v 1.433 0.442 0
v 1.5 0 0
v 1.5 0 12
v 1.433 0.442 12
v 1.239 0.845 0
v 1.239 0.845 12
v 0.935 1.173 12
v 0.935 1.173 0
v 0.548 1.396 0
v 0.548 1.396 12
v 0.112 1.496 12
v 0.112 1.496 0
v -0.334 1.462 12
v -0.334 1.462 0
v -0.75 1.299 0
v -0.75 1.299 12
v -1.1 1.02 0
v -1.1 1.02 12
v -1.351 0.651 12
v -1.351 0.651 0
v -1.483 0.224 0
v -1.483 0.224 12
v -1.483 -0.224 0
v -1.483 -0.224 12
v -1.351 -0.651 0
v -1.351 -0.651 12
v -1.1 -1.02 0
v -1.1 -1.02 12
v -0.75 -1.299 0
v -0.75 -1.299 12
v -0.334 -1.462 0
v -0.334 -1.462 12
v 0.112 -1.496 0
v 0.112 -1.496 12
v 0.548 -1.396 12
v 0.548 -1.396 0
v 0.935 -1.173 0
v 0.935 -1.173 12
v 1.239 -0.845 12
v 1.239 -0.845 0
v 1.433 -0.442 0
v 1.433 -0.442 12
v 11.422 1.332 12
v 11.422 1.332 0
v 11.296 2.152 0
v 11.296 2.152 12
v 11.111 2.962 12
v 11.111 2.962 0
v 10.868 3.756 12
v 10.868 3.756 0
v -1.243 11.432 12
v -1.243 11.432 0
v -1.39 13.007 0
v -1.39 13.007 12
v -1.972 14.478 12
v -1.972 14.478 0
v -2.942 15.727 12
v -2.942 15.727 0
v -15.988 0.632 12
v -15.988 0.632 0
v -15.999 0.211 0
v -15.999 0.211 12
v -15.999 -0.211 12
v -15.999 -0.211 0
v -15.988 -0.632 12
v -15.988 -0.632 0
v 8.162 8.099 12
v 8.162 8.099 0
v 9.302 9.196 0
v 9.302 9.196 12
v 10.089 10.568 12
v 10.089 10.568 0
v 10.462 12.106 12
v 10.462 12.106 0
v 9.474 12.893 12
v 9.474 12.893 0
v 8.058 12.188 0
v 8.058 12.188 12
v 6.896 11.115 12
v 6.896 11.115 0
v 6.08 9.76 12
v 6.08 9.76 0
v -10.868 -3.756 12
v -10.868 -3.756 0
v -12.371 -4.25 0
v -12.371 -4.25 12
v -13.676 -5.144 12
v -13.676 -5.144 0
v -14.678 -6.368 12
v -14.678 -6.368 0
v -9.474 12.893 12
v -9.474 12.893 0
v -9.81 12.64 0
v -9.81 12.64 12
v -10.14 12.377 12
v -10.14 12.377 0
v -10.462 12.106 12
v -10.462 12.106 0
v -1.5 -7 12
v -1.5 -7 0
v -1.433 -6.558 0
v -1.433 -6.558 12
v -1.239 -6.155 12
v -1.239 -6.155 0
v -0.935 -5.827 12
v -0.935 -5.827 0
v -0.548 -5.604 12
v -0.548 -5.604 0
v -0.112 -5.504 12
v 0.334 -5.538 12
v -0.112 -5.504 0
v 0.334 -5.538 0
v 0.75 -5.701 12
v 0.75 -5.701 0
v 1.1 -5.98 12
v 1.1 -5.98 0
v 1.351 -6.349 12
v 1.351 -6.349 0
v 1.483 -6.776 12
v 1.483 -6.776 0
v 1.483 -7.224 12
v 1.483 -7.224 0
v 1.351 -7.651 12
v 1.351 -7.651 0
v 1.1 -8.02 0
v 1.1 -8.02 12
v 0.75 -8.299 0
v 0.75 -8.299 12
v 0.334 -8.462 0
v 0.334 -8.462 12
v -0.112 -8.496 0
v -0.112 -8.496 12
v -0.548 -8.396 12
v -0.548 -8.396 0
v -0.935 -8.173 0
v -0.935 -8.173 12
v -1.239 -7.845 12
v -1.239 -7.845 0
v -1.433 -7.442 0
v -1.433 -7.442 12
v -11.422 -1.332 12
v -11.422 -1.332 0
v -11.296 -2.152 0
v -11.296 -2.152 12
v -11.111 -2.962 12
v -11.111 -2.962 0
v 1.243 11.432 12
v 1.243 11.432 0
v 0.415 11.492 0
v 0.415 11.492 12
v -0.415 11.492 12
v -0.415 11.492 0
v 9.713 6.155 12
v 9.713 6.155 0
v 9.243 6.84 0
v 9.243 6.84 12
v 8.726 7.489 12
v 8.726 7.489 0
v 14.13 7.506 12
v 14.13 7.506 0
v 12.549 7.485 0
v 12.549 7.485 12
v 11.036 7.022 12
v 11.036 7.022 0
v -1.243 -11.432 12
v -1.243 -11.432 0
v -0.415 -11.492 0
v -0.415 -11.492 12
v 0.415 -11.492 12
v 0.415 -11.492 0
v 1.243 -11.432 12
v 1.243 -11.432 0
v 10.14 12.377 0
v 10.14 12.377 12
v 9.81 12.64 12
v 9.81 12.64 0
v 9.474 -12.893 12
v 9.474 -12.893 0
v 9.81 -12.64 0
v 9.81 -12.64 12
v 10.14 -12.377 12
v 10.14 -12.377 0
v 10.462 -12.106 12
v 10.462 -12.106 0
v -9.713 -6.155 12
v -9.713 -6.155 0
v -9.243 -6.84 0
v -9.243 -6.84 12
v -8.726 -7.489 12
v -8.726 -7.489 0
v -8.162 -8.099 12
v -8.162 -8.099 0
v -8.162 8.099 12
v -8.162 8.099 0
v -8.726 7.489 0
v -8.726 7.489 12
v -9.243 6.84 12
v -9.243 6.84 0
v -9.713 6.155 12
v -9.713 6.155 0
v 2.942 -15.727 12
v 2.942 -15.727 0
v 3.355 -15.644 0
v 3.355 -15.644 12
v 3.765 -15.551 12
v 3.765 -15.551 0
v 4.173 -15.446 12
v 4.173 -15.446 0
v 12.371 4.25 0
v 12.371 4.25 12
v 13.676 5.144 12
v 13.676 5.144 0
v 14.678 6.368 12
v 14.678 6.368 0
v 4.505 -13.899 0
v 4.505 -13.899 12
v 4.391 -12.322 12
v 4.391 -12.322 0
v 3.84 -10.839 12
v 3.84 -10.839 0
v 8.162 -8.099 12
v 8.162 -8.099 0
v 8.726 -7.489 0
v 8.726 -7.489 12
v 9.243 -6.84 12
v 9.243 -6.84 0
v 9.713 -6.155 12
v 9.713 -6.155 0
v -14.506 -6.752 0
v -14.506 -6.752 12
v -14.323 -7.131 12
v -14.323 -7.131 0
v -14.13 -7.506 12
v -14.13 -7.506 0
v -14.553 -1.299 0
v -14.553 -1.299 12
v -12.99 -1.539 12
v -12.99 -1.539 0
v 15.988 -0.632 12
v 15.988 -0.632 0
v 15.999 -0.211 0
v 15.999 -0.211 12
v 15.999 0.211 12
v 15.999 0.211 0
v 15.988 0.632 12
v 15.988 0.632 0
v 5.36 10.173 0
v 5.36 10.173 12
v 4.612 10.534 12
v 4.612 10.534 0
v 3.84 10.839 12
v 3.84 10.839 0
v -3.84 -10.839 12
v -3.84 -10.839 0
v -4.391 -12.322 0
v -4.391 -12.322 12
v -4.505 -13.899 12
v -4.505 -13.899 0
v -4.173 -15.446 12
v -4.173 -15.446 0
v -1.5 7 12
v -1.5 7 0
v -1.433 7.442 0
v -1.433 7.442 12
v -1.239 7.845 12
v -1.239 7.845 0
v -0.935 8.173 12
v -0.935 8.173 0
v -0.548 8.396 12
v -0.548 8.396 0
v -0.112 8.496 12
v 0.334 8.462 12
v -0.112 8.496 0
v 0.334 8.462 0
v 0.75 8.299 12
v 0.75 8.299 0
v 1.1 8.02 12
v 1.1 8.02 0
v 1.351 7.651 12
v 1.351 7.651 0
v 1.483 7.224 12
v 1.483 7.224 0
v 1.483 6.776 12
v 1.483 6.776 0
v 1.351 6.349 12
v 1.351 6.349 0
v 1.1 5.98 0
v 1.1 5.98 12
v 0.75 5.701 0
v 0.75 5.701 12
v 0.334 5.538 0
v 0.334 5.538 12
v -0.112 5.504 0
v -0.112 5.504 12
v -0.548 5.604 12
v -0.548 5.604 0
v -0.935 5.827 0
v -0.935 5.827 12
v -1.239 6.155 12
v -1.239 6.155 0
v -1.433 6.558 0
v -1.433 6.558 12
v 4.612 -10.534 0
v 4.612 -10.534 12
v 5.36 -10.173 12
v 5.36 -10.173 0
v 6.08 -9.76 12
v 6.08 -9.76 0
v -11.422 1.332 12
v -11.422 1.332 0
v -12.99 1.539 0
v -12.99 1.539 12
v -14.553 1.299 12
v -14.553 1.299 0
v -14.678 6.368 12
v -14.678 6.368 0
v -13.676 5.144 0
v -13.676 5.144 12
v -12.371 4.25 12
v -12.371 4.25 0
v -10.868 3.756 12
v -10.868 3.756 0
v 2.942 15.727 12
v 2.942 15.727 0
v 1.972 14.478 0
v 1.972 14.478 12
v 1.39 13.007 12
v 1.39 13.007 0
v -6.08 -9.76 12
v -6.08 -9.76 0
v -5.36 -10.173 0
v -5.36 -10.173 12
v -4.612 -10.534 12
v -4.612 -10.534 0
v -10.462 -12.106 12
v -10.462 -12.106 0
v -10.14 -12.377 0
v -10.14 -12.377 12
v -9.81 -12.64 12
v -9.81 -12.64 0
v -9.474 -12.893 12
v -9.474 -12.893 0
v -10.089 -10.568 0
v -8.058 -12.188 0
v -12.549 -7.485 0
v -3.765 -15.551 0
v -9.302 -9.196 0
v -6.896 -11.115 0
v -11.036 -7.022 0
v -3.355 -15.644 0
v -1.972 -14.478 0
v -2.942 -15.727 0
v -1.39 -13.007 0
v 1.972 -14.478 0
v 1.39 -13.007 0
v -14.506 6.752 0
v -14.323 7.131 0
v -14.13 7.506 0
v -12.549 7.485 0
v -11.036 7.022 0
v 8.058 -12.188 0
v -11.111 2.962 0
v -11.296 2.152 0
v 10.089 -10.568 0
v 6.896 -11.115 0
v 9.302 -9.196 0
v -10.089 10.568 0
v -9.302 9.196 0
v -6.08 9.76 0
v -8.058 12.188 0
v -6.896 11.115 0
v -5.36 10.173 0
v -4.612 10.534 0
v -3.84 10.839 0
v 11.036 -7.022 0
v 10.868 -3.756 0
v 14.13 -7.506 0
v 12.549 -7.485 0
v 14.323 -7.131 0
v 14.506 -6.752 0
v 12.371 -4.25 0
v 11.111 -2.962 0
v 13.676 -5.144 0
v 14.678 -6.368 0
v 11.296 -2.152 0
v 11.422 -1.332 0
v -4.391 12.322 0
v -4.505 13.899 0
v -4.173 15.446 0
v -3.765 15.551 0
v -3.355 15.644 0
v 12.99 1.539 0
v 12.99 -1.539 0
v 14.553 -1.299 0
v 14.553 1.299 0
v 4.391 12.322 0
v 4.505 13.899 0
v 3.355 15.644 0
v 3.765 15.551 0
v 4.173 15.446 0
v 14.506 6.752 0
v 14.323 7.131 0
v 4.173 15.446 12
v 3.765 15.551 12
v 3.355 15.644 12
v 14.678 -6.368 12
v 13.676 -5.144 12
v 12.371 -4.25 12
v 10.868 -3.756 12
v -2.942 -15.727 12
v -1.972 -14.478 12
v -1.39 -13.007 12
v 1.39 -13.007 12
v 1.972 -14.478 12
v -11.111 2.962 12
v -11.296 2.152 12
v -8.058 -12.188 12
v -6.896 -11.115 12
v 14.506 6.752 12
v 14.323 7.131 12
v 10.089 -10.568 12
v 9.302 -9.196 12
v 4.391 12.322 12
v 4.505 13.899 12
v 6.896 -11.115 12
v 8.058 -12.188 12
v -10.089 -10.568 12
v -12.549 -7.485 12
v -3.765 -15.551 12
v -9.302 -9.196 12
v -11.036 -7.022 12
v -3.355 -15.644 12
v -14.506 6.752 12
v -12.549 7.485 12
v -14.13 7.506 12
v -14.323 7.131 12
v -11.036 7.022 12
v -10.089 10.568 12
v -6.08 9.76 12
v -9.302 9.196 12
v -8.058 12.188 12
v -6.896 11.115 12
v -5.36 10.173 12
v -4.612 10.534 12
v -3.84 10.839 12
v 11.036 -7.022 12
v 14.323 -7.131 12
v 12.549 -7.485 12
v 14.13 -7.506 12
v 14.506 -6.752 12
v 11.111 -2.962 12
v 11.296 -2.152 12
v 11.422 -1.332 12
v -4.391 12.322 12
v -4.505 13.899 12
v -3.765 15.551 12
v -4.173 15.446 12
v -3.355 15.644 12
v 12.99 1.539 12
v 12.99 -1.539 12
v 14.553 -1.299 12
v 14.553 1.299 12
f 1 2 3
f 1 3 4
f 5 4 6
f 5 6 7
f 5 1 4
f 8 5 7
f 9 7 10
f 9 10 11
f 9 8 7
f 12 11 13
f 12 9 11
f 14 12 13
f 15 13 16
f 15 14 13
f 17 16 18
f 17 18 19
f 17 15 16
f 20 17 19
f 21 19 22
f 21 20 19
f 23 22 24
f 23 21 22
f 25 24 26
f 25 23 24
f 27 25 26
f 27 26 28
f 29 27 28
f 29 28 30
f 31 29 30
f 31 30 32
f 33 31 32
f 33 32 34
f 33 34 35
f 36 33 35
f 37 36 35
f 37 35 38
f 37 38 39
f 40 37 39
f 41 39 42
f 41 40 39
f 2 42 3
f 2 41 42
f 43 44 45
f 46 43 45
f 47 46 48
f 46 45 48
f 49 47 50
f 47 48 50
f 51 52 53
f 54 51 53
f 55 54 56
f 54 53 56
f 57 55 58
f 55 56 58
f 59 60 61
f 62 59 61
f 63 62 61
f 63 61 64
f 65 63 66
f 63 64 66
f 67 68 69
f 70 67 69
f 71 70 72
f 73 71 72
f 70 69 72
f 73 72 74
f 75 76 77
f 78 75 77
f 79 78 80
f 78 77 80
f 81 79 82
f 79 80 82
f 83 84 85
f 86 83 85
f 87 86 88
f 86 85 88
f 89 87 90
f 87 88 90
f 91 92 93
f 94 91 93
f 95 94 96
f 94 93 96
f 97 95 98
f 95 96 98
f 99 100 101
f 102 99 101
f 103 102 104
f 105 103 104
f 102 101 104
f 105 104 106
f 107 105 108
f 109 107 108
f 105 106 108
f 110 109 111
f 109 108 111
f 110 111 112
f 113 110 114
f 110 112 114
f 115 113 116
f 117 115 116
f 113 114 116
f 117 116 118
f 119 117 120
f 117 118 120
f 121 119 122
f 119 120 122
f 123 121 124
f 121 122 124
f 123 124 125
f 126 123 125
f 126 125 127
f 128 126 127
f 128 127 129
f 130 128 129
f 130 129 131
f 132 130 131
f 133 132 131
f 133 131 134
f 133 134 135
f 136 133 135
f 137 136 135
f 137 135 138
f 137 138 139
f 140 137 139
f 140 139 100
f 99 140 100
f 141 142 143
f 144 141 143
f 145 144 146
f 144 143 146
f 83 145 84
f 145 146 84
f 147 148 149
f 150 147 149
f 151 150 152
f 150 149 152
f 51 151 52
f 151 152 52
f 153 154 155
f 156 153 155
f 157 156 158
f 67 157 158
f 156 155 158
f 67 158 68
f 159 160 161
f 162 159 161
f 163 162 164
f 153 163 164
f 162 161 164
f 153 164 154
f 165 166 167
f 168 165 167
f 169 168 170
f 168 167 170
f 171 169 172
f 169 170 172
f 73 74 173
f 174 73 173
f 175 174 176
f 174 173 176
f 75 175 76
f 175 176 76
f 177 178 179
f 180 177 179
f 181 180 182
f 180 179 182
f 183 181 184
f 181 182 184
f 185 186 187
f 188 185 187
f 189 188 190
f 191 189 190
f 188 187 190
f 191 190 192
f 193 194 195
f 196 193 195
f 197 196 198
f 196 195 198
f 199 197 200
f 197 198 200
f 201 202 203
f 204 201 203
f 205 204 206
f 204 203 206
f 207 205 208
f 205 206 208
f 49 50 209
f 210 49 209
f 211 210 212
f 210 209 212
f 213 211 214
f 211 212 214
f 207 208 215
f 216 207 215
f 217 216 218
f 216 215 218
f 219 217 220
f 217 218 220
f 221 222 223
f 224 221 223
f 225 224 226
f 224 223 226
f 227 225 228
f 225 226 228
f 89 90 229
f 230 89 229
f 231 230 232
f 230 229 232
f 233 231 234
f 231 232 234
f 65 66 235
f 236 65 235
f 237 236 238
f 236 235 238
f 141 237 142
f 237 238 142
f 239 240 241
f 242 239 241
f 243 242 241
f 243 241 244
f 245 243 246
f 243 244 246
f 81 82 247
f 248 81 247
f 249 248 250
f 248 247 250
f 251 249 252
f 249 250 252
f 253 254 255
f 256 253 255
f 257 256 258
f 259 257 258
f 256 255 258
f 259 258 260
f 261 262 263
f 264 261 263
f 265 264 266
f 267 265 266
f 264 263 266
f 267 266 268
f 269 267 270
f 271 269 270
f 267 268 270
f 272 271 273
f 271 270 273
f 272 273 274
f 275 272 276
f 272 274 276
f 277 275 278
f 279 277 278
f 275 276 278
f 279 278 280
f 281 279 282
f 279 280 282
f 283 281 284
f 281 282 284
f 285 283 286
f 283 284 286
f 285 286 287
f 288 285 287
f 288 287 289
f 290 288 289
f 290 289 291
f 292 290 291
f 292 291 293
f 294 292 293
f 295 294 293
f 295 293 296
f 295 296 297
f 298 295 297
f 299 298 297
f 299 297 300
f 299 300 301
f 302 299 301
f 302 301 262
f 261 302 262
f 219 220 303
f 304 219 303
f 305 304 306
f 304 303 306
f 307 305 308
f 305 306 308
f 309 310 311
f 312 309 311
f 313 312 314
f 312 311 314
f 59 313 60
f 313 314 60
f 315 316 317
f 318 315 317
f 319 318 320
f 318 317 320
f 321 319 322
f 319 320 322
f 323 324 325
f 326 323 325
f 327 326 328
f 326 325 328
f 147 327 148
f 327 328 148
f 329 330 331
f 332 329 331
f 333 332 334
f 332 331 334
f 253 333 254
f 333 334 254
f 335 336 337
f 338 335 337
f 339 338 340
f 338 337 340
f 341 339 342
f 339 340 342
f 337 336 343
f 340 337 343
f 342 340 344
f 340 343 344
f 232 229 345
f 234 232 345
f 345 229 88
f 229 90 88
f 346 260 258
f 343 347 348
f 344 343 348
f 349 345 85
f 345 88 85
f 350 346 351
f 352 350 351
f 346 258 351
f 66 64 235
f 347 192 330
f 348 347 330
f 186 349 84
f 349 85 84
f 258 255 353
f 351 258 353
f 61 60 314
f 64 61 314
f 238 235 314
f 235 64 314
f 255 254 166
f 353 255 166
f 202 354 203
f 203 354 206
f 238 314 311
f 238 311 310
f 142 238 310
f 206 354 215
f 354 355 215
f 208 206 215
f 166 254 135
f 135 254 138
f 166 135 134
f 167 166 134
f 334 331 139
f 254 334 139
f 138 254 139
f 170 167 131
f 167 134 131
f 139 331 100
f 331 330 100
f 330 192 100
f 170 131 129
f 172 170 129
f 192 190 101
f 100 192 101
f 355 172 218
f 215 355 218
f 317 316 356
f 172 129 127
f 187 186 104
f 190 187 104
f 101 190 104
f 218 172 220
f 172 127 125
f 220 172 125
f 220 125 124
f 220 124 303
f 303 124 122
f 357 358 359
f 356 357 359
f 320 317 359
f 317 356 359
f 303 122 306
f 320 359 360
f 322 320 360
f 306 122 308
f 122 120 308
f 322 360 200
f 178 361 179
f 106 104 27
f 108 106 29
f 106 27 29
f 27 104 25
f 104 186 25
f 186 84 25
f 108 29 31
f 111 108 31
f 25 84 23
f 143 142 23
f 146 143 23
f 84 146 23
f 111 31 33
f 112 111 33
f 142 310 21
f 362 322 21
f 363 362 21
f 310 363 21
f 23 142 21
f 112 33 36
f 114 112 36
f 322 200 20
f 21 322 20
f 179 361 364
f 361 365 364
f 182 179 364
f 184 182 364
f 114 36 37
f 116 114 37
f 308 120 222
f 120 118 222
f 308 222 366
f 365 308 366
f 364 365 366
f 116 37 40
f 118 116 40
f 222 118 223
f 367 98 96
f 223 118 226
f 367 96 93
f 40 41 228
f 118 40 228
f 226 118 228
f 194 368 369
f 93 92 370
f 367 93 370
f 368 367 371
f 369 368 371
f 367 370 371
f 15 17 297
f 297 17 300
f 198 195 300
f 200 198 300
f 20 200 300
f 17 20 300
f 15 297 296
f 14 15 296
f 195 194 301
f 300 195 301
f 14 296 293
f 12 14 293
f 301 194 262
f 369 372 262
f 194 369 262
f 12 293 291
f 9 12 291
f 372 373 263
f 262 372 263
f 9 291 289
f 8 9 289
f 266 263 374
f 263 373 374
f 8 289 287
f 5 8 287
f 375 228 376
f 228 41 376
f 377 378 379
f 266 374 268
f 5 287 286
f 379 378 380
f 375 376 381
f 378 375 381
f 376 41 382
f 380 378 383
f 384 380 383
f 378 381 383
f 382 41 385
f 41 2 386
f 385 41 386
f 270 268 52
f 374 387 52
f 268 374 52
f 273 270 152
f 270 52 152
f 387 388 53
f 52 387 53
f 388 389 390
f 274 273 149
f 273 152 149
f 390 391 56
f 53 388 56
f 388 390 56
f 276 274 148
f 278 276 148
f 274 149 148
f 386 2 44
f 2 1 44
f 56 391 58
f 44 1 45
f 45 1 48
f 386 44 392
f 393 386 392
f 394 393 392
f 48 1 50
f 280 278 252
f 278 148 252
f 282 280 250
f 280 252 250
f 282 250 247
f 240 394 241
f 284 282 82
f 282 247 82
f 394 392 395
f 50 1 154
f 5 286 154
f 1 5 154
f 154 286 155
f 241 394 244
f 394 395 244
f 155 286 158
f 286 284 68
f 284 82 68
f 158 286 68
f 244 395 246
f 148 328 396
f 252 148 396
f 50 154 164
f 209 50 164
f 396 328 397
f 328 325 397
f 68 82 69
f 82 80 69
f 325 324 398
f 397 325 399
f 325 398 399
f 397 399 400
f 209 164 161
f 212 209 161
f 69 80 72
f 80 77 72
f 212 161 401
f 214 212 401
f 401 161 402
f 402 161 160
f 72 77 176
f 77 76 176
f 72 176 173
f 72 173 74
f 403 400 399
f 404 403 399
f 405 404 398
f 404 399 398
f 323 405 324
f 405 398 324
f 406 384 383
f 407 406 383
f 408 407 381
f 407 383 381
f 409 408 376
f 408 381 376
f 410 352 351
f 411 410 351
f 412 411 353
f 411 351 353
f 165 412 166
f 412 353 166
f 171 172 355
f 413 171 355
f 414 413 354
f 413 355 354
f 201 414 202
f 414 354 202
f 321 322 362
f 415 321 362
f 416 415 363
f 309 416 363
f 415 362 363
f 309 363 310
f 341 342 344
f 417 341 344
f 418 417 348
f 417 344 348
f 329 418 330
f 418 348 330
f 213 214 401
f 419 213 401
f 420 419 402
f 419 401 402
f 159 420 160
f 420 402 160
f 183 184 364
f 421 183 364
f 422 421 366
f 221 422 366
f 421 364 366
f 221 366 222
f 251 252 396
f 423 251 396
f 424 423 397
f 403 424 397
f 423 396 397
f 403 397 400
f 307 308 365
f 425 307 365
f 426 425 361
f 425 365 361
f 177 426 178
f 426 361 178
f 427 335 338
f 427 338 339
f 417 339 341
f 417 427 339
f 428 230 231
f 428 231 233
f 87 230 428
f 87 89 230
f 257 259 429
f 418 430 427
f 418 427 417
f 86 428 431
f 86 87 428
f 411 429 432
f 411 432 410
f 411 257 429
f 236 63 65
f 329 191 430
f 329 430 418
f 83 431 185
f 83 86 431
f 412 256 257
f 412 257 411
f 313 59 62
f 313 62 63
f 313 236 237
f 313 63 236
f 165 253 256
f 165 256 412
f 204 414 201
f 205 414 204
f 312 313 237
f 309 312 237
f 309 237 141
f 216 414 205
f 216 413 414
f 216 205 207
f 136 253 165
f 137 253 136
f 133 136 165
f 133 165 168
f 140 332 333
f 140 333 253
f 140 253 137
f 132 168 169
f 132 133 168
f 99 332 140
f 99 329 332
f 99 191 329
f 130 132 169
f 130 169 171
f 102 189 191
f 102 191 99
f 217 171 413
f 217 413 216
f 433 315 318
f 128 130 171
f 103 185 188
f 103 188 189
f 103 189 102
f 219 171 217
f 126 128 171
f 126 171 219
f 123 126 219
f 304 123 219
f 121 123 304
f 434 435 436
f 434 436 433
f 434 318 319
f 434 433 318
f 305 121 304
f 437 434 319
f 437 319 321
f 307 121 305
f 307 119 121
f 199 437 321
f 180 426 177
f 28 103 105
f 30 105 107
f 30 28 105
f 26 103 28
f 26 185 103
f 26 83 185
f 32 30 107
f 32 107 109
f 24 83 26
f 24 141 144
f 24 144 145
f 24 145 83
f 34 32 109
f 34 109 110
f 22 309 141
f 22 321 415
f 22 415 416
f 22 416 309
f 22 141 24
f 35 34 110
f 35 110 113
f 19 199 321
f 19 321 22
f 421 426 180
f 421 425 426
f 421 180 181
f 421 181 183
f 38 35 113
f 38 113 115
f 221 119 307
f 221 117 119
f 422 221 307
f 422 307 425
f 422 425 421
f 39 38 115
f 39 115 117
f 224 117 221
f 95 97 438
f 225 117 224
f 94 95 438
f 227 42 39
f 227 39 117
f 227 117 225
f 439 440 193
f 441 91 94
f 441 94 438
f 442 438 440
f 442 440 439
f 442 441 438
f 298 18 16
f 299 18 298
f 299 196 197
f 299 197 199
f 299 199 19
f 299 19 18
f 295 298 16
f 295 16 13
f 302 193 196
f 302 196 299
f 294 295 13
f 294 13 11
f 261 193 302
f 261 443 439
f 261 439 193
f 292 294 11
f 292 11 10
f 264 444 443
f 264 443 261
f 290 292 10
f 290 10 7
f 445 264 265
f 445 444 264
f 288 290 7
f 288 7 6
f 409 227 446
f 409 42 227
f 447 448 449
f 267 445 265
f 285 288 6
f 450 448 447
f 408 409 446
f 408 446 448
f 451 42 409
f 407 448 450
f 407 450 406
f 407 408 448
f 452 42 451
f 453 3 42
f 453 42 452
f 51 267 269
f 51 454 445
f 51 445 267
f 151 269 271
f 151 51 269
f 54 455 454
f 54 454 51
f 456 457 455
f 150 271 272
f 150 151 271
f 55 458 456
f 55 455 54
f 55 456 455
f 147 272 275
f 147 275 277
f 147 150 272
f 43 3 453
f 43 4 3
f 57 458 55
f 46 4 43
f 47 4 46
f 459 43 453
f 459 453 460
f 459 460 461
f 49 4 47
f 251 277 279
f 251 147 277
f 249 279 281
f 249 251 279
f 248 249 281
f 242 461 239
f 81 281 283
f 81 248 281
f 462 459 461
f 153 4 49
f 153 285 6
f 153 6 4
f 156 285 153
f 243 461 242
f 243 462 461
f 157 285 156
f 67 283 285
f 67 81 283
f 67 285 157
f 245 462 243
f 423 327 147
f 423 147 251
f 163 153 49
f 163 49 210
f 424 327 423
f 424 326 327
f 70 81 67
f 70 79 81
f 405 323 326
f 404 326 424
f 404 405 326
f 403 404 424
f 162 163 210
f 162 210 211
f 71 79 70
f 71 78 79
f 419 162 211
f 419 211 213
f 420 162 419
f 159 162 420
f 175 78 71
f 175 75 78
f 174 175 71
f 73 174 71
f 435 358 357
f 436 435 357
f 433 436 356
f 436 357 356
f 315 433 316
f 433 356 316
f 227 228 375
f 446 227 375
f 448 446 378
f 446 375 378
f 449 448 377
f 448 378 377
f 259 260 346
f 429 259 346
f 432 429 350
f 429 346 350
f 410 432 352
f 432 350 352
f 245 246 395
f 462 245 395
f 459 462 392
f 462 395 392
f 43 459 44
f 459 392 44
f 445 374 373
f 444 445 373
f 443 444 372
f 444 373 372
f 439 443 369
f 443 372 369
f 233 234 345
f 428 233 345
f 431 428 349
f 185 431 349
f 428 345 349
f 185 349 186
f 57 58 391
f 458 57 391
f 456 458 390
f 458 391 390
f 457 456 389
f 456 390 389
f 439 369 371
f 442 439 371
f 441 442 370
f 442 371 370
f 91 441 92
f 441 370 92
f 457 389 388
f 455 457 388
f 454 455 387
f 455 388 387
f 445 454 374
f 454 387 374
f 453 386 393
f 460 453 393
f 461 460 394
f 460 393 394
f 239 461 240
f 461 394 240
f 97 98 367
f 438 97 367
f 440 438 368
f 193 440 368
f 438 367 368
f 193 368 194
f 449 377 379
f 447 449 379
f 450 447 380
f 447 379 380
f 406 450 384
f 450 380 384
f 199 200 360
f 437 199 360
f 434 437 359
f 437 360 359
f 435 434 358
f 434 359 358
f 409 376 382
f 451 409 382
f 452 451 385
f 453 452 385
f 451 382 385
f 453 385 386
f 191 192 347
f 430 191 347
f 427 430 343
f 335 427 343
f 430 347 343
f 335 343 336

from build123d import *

# Parameters (mm, degrees)
CROQUIS1_R              = 1.5
SALIENTE_EXTRUIR1_DEPTH = 12
CROQUIS2_R              = 1.5
CORTAR_EXTRUIR1_DEPTH   = 26.442992774


with BuildPart() as part:
    # Croquis1 → Saliente-Extruir1 (new body)
    with BuildSketch(Plane.XY):
        with BuildLine():
            ThreePointArc((-14.13022151, -7.505787105), (-11.775764132, -7.307322196), (-9.712736286, -6.155465444))
            ThreePointArc((-9.712736286, -6.155465444), (-8.990280217, -7.169509232), (-8.162422223, -8.09949779))
            ThreePointArc((-8.162422223, -8.09949779), (-9.744466405, -9.854488979), (-10.461871439, -12.105752599))
            ThreePointArc((-10.461871439, -12.105752599), (-9.97583683, -12.509303719), (-9.474250703, -12.893353854))
            ThreePointArc((-9.474250703, -12.893353854), (-7.439068601, -11.692982379), (-6.080116654, -9.760081069))
            ThreePointArc((-6.080116654, -9.760081069), (-4.989229116, -10.360241012), (-3.839847924, -10.838937629))
            ThreePointArc((-3.839847924, -10.838937629), (-4.50375834, -13.106553299), (-4.173331264, -15.446142112))
            ThreePointArc((-4.173331264, -15.446142112), (-3.560334943, -15.598846595), (-2.94178835, -15.727233746))
            ThreePointArc((-2.94178835, -15.727233746), (-1.6289743, -13.762703997), (-1.24325535, -11.43159294))
            ThreePointArc((-1.24325535, -11.43159294), (0, -11.499), (1.24325535, -11.43159294))
            ThreePointArc((1.24325535, -11.43159294), (1.6289743, -13.762703997), (2.94178835, -15.727233746))
            ThreePointArc((2.94178835, -15.727233746), (3.560334943, -15.598846595), (4.173331264, -15.446142112))
            ThreePointArc((4.173331264, -15.446142112), (4.50375834, -13.106553299), (3.839847924, -10.838937629))
            ThreePointArc((3.839847924, -10.838937629), (4.989229116, -10.360241012), (6.080116654, -9.760081069))
            ThreePointArc((6.080116654, -9.760081069), (7.439068601, -11.692982379), (9.474250703, -12.893353854))
            ThreePointArc((9.474250703, -12.893353854), (9.97583683, -12.509303719), (10.461871439, -12.105752599))
            ThreePointArc((10.461871439, -12.105752599), (9.744466405, -9.854488979), (8.162422223, -8.09949779))
            ThreePointArc((8.162422223, -8.09949779), (8.990280217, -7.169509232), (9.712736286, -6.155465444))
            ThreePointArc((9.712736286, -6.155465444), (11.775764132, -7.307322196), (14.13022151, -7.505787105))
            ThreePointArc((14.13022151, -7.505787105), (14.415501886, -6.942139826), (14.678309669, -6.367670316))
            ThreePointArc((14.678309669, -6.367670316), (13.055163391, -4.65062226), (10.868328696, -3.75585308))
            ThreePointArc((10.868328696, -3.75585308), (11.210696062, -2.55876822), (11.421629379, -1.331684395))
            ThreePointArc((11.421629379, -1.331684395), (13.780125156, -1.474357234), (15.987528652, -0.631607167))
            ThreePointArc((15.987528652, -0.631607167), (16, 0), (15.987528652, 0.631607167))
            ThreePointArc((15.987528652, 0.631607167), (13.780125156, 1.474357234), (11.421629379, 1.331684395))
            ThreePointArc((11.421629379, 1.331684395), (11.210696062, 2.55876822), (10.868328696, 3.75585308))
            ThreePointArc((10.868328696, 3.75585308), (13.055163391, 4.65062226), (14.678309669, 6.367670316))
            ThreePointArc((14.678309669, 6.367670316), (14.415501886, 6.942139826), (14.13022151, 7.505787105))
            ThreePointArc((14.13022151, 7.505787105), (11.775764132, 7.307322196), (9.712736286, 6.155465444))
            ThreePointArc((9.712736286, 6.155465444), (8.990280217, 7.169509232), (8.162422223, 8.09949779))
            ThreePointArc((8.162422223, 8.09949779), (9.744466405, 9.854488979), (10.461871439, 12.105752599))
            ThreePointArc((10.461871439, 12.105752599), (9.97583683, 12.509303719), (9.474250703, 12.893353854))
            ThreePointArc((9.474250703, 12.893353854), (7.439068601, 11.692982379), (6.080116654, 9.760081069))
            ThreePointArc((6.080116654, 9.760081069), (4.989229116, 10.360241012), (3.839847924, 10.838937629))
            ThreePointArc((3.839847924, 10.838937629), (4.50375834, 13.106553299), (4.173331264, 15.446142112))
            ThreePointArc((4.173331264, 15.446142112), (3.560334943, 15.598846595), (2.94178835, 15.727233746))
            ThreePointArc((2.94178835, 15.727233746), (1.6289743, 13.762703997), (1.24325535, 11.43159294))
            ThreePointArc((1.24325535, 11.43159294), (0, 11.499), (-1.24325535, 11.43159294))
            ThreePointArc((-1.24325535, 11.43159294), (-1.6289743, 13.762703997), (-2.94178835, 15.727233746))
            ThreePointArc((-2.94178835, 15.727233746), (-3.560334943, 15.598846595), (-4.173331264, 15.446142112))
            ThreePointArc((-4.173331264, 15.446142112), (-4.50375834, 13.106553299), (-3.839847924, 10.838937629))
            ThreePointArc((-3.839847924, 10.838937629), (-4.989229116, 10.360241012), (-6.080116654, 9.760081069))
            ThreePointArc((-6.080116654, 9.760081069), (-7.439068601, 11.692982379), (-9.474250703, 12.893353854))
            ThreePointArc((-9.474250703, 12.893353854), (-9.97583683, 12.509303719), (-10.461871439, 12.105752599))
            ThreePointArc((-10.461871439, 12.105752599), (-9.744466405, 9.854488979), (-8.162422223, 8.09949779))
            ThreePointArc((-8.162422223, 8.09949779), (-8.990280217, 7.169509232), (-9.712736286, 6.155465444))
            ThreePointArc((-9.712736286, 6.155465444), (-11.775764132, 7.307322196), (-14.13022151, 7.505787105))
            ThreePointArc((-14.13022151, 7.505787105), (-14.415501886, 6.942139826), (-14.678309669, 6.367670316))
            ThreePointArc((-14.678309669, 6.367670316), (-13.055163391, 4.65062226), (-10.868328696, 3.75585308))
            ThreePointArc((-10.868328696, 3.75585308), (-11.210696062, 2.55876822), (-11.421629379, 1.331684395))
            ThreePointArc((-11.421629379, 1.331684395), (-13.780125156, 1.474357234), (-15.987528652, 0.631607167))
            ThreePointArc((-15.987528652, 0.631607167), (-16, 0), (-15.987528652, -0.631607167))
            ThreePointArc((-15.987528652, -0.631607167), (-13.780125156, -1.474357234), (-11.421629379, -1.331684395))
            ThreePointArc((-11.421629379, -1.331684395), (-11.210696062, -2.55876822), (-10.868328696, -3.75585308))
            ThreePointArc((-10.868328696, -3.75585308), (-13.055163391, -4.65062226), (-14.678309669, -6.367670316))
            ThreePointArc((-14.678309669, -6.367670316), (-14.415501886, -6.942139826), (-14.13022151, -7.505787105))
        make_face()
        Circle(CROQUIS1_R, mode=Mode.SUBTRACT)
    extrude(amount=SALIENTE_EXTRUIR1_DEPTH)

    # Croquis2 → Cortar-Extruir1 (cut, through all)
    with BuildSketch(Plane(origin=(0, 0, 0), x_dir=(-1, 0, 0), z_dir=(0, 0, -1))):
        with Locations((0, 7)):
            Circle(CROQUIS2_R)
        with Locations((0, -7)):
            Circle(CROQUIS2_R)
    extrude(amount=-CORTAR_EXTRUIR1_DEPTH, mode=Mode.SUBTRACT)


solid = part.part
